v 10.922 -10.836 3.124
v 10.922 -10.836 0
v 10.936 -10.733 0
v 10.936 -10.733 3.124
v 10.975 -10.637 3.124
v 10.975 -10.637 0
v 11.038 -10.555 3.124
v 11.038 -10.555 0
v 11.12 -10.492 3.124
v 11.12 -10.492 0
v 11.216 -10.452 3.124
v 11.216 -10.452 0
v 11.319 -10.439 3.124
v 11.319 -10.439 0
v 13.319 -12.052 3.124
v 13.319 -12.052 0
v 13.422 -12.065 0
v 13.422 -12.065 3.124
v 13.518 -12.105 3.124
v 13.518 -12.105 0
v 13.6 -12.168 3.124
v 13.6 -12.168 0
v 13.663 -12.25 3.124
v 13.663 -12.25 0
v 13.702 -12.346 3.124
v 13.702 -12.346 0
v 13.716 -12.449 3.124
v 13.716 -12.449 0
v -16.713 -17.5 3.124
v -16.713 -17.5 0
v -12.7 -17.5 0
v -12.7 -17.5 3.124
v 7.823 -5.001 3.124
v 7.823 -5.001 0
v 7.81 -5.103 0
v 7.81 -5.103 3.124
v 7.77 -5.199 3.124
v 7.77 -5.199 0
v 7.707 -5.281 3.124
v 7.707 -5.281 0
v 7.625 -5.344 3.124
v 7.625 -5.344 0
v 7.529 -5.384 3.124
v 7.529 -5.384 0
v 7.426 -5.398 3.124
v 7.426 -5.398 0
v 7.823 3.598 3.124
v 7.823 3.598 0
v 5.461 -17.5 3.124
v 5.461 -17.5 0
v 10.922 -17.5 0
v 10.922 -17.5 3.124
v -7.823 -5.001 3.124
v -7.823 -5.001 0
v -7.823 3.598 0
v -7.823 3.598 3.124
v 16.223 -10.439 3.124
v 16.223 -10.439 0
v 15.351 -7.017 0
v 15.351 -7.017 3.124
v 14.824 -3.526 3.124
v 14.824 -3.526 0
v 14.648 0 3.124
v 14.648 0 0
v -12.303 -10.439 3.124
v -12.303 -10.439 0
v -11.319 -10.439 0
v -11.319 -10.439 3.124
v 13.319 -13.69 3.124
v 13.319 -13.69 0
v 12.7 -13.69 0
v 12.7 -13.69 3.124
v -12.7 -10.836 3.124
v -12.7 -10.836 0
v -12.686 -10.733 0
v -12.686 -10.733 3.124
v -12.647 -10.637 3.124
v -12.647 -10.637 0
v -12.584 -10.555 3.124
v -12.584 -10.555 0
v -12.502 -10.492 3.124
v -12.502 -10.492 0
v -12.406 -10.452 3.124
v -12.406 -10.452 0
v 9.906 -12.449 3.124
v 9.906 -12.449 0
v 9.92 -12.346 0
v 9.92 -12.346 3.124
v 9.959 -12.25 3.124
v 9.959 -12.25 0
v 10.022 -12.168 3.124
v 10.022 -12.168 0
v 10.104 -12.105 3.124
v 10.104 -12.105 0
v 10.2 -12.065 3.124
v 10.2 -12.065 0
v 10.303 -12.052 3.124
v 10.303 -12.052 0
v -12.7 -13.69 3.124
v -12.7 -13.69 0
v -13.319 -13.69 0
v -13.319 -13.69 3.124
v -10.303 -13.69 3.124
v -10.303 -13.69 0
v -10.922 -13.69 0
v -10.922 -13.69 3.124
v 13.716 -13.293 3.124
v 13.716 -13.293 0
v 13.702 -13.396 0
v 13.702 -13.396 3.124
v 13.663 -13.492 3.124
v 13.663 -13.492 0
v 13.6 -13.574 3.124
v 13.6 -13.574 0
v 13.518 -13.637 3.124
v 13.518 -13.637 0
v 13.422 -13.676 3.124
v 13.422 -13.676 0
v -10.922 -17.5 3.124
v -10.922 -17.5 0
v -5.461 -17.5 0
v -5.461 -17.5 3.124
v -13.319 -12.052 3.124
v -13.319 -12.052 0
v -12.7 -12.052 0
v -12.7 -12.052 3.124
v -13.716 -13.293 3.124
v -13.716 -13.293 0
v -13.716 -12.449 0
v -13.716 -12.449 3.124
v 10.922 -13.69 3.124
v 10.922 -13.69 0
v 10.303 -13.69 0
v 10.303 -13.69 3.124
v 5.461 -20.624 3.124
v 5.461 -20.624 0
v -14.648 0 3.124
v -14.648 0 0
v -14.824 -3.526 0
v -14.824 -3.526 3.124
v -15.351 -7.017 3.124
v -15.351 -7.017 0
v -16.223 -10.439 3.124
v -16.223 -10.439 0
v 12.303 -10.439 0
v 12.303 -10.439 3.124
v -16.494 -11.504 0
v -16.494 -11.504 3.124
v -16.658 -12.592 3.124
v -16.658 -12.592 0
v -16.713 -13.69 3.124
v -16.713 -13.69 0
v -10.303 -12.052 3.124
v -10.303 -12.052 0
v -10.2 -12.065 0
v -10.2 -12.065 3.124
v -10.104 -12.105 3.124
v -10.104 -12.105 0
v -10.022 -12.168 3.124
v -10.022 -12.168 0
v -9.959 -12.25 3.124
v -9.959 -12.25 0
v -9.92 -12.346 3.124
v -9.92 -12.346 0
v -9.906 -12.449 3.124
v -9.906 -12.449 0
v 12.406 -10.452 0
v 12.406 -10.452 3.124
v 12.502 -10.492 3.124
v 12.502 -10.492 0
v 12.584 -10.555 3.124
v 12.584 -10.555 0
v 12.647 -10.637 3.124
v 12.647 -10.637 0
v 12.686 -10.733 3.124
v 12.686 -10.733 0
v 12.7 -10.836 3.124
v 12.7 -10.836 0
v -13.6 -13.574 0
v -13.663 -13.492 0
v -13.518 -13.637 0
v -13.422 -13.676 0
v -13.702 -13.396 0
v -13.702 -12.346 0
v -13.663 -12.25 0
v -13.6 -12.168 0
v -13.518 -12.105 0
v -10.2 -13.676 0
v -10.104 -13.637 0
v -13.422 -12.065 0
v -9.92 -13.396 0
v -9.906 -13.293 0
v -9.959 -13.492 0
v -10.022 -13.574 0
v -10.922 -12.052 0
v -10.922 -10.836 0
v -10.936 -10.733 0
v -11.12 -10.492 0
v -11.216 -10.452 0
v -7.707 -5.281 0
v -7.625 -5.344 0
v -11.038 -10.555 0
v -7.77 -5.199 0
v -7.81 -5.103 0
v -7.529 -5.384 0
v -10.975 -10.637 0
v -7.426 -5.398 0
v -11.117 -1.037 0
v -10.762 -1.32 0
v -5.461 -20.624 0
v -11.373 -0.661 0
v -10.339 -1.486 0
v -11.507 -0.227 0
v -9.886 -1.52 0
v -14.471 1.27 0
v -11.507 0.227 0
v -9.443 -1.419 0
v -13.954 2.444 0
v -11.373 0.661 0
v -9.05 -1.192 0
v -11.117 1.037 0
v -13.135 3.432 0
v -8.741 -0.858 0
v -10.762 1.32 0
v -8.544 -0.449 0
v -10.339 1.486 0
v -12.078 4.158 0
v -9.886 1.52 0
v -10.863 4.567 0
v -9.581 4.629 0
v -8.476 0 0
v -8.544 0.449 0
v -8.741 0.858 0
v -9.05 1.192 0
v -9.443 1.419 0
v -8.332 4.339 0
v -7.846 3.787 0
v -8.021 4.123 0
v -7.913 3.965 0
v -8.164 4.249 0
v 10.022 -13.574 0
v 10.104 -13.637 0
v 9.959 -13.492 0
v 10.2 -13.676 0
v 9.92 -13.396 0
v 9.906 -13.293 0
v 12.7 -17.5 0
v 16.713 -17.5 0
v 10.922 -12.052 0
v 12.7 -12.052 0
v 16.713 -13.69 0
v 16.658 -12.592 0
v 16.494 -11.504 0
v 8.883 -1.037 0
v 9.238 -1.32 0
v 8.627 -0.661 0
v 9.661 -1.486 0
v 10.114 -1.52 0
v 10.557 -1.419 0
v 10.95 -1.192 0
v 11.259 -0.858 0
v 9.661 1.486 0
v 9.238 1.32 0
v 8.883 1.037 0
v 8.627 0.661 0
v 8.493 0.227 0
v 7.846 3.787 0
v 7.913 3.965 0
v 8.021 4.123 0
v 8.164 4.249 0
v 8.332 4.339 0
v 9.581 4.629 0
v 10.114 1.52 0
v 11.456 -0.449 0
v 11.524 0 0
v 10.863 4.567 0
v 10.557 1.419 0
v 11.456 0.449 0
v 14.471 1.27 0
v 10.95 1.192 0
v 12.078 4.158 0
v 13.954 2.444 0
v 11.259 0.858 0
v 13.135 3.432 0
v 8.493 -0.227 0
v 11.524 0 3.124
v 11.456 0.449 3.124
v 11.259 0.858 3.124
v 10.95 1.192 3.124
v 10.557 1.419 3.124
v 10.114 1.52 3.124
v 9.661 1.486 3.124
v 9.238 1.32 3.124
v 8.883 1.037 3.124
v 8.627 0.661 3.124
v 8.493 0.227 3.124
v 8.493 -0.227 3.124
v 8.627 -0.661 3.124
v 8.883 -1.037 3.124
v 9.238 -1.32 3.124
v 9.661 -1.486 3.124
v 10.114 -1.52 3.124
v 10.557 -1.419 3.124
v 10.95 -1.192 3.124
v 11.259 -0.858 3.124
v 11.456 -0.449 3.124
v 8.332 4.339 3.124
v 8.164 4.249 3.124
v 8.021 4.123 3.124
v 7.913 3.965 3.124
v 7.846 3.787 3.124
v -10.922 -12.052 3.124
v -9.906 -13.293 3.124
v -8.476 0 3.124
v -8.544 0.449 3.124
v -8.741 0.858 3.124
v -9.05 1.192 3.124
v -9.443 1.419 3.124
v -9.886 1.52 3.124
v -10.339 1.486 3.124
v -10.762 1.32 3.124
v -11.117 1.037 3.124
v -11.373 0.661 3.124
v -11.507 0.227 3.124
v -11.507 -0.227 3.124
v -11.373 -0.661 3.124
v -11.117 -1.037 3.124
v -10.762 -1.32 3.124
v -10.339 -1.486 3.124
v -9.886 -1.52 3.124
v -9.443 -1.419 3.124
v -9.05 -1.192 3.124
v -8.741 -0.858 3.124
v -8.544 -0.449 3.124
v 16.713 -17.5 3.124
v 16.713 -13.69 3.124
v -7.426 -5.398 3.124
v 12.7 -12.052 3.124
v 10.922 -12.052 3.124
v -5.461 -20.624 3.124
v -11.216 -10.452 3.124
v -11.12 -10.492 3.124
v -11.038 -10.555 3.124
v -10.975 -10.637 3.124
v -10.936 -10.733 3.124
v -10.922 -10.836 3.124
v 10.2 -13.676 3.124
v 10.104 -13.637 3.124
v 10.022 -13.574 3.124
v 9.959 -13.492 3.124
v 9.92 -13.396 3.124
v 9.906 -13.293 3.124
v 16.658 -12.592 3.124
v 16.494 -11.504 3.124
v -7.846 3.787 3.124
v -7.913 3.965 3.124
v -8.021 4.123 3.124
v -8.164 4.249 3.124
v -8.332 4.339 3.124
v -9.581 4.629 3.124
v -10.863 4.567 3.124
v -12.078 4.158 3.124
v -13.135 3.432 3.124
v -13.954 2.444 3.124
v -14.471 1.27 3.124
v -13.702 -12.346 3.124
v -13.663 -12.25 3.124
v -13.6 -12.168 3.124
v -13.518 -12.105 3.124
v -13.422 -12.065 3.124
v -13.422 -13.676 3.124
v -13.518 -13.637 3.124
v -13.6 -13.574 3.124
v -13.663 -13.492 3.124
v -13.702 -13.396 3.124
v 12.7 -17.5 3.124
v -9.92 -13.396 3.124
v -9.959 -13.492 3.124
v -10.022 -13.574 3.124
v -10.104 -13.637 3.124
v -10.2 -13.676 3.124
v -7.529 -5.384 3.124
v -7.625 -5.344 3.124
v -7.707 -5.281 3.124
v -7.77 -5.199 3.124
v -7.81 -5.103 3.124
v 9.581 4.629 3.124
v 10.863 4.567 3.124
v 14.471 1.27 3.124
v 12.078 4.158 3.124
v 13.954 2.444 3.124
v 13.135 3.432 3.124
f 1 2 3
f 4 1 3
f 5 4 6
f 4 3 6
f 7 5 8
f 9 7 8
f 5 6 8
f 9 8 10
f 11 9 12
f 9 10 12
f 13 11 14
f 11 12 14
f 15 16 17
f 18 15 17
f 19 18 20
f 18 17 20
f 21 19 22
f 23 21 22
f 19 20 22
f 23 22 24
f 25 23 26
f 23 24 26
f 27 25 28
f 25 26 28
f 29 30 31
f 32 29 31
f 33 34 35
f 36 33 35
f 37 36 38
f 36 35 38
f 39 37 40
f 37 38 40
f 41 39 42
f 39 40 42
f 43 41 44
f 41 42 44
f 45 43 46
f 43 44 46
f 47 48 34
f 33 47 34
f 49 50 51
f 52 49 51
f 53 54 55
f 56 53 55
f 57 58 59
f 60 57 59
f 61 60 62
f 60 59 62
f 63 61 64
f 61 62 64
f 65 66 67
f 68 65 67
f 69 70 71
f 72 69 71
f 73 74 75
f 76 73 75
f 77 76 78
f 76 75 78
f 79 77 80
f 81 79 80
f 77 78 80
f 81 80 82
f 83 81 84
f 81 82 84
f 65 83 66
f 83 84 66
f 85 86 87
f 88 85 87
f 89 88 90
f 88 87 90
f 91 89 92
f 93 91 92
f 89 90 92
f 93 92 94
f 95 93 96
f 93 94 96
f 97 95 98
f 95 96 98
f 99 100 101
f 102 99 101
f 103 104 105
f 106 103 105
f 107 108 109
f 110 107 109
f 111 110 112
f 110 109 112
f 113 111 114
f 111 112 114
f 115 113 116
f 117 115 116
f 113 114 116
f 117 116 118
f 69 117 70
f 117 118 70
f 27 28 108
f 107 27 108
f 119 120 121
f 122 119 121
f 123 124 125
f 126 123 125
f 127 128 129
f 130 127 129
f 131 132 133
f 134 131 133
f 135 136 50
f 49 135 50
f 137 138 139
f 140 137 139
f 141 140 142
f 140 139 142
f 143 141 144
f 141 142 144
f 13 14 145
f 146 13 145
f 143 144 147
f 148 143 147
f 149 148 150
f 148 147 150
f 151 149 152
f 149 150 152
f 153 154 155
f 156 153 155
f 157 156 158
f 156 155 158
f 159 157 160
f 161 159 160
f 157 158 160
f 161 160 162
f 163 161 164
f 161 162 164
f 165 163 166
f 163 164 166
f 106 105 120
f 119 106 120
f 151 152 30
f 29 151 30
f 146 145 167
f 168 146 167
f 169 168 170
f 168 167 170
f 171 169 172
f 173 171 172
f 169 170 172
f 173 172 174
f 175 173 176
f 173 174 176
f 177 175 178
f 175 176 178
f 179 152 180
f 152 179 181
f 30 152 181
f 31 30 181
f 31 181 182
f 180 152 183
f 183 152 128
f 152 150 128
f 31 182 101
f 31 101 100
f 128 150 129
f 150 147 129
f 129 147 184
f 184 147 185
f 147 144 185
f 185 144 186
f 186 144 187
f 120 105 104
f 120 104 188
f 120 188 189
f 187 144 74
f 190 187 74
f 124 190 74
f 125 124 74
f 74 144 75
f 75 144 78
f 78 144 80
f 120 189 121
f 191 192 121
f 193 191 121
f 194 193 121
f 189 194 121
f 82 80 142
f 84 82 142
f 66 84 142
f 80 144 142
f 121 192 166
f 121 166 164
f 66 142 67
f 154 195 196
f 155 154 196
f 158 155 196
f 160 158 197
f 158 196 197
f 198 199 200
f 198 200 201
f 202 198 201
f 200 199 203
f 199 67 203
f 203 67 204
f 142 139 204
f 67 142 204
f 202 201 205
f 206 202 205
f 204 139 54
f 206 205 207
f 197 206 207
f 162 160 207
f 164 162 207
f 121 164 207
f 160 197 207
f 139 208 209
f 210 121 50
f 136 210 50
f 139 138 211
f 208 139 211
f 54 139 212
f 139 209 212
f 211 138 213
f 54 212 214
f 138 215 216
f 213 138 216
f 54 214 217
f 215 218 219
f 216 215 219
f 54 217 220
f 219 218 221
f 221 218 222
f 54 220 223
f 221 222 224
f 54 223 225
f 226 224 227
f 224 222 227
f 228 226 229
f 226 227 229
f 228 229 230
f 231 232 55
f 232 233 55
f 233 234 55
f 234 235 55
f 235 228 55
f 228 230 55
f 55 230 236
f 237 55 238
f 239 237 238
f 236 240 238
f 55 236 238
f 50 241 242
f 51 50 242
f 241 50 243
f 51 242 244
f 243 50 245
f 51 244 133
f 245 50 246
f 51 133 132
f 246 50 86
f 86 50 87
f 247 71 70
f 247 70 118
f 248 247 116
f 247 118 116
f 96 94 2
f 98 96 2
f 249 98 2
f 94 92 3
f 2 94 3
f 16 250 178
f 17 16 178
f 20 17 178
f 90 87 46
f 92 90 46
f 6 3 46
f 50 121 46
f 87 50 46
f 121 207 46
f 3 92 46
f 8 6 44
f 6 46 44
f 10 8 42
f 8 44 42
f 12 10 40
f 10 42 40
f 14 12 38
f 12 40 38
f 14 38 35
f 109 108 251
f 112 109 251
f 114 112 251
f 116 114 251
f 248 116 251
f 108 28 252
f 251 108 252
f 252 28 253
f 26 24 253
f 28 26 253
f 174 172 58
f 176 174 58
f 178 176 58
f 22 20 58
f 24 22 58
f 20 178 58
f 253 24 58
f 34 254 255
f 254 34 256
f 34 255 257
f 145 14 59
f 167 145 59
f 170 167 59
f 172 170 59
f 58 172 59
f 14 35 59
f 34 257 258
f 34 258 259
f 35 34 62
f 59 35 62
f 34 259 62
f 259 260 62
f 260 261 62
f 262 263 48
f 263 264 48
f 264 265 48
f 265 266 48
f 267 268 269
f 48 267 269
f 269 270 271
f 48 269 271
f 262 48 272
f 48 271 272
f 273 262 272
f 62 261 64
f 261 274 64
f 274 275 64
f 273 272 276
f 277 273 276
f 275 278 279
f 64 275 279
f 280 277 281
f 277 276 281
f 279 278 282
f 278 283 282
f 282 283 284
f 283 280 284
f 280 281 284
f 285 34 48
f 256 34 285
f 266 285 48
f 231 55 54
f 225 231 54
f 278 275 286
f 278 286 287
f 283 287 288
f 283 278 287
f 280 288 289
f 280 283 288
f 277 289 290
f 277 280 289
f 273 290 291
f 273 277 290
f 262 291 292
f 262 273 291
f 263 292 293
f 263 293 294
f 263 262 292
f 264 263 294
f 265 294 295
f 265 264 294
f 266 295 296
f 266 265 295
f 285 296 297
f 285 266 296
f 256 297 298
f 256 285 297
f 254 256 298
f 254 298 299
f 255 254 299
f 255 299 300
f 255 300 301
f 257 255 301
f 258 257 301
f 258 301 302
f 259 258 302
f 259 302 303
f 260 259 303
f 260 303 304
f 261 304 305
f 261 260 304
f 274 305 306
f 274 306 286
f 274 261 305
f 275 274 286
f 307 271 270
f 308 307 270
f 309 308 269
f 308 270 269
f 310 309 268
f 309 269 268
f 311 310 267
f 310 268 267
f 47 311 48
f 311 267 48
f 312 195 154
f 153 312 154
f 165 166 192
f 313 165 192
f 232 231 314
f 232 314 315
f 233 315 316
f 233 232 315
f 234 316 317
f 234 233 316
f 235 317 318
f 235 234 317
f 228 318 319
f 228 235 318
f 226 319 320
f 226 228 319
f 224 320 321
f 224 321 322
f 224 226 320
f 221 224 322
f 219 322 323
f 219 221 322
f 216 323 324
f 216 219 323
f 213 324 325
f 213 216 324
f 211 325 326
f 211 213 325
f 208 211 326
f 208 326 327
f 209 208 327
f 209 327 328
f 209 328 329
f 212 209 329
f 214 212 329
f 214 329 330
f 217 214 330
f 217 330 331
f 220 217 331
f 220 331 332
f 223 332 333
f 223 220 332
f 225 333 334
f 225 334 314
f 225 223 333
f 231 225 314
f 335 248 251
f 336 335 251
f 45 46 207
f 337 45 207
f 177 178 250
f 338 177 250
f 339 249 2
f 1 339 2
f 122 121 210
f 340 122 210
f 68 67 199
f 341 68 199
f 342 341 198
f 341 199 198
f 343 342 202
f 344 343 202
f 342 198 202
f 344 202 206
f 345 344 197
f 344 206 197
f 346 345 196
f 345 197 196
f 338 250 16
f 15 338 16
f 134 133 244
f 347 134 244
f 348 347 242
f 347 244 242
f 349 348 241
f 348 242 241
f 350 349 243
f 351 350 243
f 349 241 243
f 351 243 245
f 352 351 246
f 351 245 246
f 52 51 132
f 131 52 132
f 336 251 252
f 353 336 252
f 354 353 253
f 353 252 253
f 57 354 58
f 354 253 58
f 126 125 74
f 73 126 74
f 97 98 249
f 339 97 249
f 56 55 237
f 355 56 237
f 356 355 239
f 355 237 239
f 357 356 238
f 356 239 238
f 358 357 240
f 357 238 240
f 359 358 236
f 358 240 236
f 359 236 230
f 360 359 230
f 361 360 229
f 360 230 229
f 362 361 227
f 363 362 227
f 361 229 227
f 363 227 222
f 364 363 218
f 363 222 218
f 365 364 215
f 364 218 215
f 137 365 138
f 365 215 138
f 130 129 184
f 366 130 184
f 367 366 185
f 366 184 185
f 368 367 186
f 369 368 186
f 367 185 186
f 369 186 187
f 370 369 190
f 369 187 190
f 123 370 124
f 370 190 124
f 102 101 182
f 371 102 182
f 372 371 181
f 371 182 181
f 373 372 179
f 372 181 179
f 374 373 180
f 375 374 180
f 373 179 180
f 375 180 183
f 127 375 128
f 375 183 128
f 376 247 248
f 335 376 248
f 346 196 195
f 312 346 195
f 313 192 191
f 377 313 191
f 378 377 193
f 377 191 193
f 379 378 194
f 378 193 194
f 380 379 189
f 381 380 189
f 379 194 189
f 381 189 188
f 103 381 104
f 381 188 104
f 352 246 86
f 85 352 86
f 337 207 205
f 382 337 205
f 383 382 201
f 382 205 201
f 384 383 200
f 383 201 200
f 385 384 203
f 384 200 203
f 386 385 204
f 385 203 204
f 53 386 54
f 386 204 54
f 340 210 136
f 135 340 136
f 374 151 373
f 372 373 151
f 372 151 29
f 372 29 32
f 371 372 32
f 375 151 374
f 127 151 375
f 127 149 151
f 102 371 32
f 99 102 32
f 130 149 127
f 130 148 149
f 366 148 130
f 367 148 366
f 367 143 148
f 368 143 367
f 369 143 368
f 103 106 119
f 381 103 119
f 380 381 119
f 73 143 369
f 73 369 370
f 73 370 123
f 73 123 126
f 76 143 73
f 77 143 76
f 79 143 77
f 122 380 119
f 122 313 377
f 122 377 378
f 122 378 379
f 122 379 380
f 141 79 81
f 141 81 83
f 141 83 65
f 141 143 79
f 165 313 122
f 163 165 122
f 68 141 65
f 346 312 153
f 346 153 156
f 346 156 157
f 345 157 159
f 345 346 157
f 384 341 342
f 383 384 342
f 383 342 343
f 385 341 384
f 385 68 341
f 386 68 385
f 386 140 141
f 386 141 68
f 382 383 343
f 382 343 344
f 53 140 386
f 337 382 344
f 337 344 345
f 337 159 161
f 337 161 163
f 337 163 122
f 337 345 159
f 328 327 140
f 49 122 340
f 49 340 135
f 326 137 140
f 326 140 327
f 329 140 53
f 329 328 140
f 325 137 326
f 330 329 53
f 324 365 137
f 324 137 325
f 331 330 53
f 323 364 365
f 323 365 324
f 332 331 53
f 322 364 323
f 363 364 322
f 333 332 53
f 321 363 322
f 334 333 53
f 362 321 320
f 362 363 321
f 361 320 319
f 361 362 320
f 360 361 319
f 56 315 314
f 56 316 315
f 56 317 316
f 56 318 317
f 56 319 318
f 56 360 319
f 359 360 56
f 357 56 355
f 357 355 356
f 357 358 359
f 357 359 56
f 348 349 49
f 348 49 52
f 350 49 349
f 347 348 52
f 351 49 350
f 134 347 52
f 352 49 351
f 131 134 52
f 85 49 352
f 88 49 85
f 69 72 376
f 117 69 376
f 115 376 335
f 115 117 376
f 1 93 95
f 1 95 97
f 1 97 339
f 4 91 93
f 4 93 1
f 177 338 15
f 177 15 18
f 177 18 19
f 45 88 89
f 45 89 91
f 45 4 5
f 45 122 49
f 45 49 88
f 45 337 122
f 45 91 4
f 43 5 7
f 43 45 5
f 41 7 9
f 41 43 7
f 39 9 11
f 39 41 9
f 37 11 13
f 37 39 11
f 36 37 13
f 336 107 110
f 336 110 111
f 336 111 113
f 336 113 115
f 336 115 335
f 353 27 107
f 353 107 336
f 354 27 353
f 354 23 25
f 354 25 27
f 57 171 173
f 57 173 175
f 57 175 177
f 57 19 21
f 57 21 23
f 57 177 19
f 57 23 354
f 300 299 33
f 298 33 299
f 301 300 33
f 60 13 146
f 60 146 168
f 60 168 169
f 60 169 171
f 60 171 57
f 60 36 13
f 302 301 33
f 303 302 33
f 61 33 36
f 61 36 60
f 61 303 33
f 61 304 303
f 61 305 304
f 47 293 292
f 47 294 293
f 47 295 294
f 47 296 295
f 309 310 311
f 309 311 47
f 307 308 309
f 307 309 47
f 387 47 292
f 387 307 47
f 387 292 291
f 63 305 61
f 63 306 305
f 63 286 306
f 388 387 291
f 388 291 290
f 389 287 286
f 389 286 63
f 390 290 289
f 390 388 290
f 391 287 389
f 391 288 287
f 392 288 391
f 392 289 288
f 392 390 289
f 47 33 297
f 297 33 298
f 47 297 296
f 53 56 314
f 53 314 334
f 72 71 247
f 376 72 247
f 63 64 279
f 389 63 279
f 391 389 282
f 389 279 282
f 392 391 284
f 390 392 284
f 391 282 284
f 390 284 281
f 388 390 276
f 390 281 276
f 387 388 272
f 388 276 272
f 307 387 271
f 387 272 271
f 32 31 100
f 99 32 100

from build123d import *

# Parameters (mm, degrees)
CROQUIS1_R              = 1.524
SALIENTE_EXTRUIR1_DEPTH = 3.1242


with BuildPart() as part:
    # Croquis1 → Saliente-Extruir1 (new body)
    with BuildSketch(Plane.XY):
        with BuildLine():
            ThreePointArc((8.332137397, 4.338663109), (7.962691234, 4.047198075), (7.8232, 3.597771185))
            Line((7.8232, 3.597771185), (7.8232, -5.000625))
            ThreePointArc((7.8232, -5.000625), (7.706958004, -5.281258004), (7.426325, -5.3975))
            Line((7.426325, -5.3975), (-7.426325, -5.3975))
            ThreePointArc((-7.426325, -5.3975), (-7.706958004, -5.281258004), (-7.8232, -5.000625))
            Line((-7.8232, -5.000625), (-7.8232, 3.597771185))
            ThreePointArc((-7.8232, 3.597771185), (-7.962691234, 4.047198075), (-8.332137397, 4.338663109))
            ThreePointArc((-8.332137397, 4.338663109), (-12.631843868, 3.831339334), (-14.6482, 0))
            ThreePointArc((-14.6482, 0), (-15.044061243, -5.278443796), (-16.222788897, -10.4388))
            ThreePointArc((-16.222788897, -10.4388), (-16.58990766, -12.046010608), (-16.7132, -13.69))
            Line((-16.7132, -13.69), (-16.7132, -17.5))
            Line((-16.7132, -17.5), (-12.7, -17.5))
            Line((-12.7, -17.5), (-12.7, -13.69))
            Line((-12.7, -13.69), (-13.319125, -13.69))
            ThreePointArc((-13.319125, -13.69), (-13.599758004, -13.573758004), (-13.716, -13.293125))
            Line((-13.716, -13.293125), (-13.716, -12.448575))
            ThreePointArc((-13.716, -12.448575), (-13.599758004, -12.167941996), (-13.319125, -12.0517))
            Line((-13.319125, -12.0517), (-12.7, -12.0517))
            Line((-12.7, -12.0517), (-12.7, -10.835675))
            ThreePointArc((-12.7, -10.835675), (-12.583758004, -10.555041996), (-12.303125, -10.4388))
            Line((-12.303125, -10.4388), (-11.318875, -10.4388))
            ThreePointArc((-11.318875, -10.4388), (-11.038241996, -10.555041996), (-10.922, -10.835675))
            Line((-10.922, -10.835675), (-10.922, -12.0517))
            Line((-10.922, -12.0517), (-10.302875, -12.0517))
            ThreePointArc((-10.302875, -12.0517), (-10.022241996, -12.167941996), (-9.906, -12.448575))
            Line((-9.906, -12.448575), (-9.906, -13.293125))
            ThreePointArc((-9.906, -13.293125), (-10.022241996, -13.573758004), (-10.302875, -13.69))
            Line((-10.302875, -13.69), (-10.922, -13.69))
            Line((-10.922, -13.69), (-10.922, -17.5))
            Line((-10.922, -17.5), (-5.461, -17.5))
            Line((-5.461, -17.5), (-5.461, -20.6242))
            Line((-5.461, -20.6242), (5.461, -20.6242))
            Line((5.461, -20.6242), (5.461, -17.5))
            Line((5.461, -17.5), (10.922, -17.5))
            Line((10.922, -17.5), (10.922, -13.69))
            Line((10.922, -13.69), (10.302875, -13.69))
            ThreePointArc((10.302875, -13.69), (10.022241996, -13.573758004), (9.906, -13.293125))
            Line((9.906, -13.293125), (9.906, -12.448575))
            ThreePointArc((9.906, -12.448575), (10.022241996, -12.167941996), (10.302875, -12.0517))
            Line((10.302875, -12.0517), (10.922, -12.0517))
            Line((10.922, -12.0517), (10.922, -10.835675))
            ThreePointArc((10.922, -10.835675), (11.038241996, -10.555041996), (11.318875, -10.4388))
            Line((11.318875, -10.4388), (12.303125, -10.4388))
            ThreePointArc((12.303125, -10.4388), (12.583758004, -10.555041996), (12.7, -10.835675))
            Line((12.7, -10.835675), (12.7, -12.0517))
            Line((12.7, -12.0517), (13.319125, -12.0517))
            ThreePointArc((13.319125, -12.0517), (13.599758004, -12.167941996), (13.716, -12.448575))
            Line((13.716, -12.448575), (13.716, -13.293125))
            ThreePointArc((13.716, -13.293125), (13.599758004, -13.573758004), (13.319125, -13.69))
            Line((13.319125, -13.69), (12.7, -13.69))
            Line((12.7, -13.69), (12.7, -17.5))
            Line((12.7, -17.5), (16.7132, -17.5))
            Line((16.7132, -17.5), (16.7132, -13.69))
            ThreePointArc((16.7132, -13.69), (16.58990766, -12.046010608), (16.222788897, -10.4388))
            ThreePointArc((16.222788897, -10.4388), (15.044061243, -5.278443796), (14.6482, 0))
            ThreePointArc((14.6482, 0), (12.631843868, 3.831339334), (8.332137397, 4.338663109))
        make_face()
        with Locations((10, 0)):
            Circle(CROQUIS1_R, mode=Mode.SUBTRACT)
        with Locations((-10, 0)):
            Circle(CROQUIS1_R, mode=Mode.SUBTRACT)
    extrude(amount=SALIENTE_EXTRUIR1_DEPTH)


solid = part.part
